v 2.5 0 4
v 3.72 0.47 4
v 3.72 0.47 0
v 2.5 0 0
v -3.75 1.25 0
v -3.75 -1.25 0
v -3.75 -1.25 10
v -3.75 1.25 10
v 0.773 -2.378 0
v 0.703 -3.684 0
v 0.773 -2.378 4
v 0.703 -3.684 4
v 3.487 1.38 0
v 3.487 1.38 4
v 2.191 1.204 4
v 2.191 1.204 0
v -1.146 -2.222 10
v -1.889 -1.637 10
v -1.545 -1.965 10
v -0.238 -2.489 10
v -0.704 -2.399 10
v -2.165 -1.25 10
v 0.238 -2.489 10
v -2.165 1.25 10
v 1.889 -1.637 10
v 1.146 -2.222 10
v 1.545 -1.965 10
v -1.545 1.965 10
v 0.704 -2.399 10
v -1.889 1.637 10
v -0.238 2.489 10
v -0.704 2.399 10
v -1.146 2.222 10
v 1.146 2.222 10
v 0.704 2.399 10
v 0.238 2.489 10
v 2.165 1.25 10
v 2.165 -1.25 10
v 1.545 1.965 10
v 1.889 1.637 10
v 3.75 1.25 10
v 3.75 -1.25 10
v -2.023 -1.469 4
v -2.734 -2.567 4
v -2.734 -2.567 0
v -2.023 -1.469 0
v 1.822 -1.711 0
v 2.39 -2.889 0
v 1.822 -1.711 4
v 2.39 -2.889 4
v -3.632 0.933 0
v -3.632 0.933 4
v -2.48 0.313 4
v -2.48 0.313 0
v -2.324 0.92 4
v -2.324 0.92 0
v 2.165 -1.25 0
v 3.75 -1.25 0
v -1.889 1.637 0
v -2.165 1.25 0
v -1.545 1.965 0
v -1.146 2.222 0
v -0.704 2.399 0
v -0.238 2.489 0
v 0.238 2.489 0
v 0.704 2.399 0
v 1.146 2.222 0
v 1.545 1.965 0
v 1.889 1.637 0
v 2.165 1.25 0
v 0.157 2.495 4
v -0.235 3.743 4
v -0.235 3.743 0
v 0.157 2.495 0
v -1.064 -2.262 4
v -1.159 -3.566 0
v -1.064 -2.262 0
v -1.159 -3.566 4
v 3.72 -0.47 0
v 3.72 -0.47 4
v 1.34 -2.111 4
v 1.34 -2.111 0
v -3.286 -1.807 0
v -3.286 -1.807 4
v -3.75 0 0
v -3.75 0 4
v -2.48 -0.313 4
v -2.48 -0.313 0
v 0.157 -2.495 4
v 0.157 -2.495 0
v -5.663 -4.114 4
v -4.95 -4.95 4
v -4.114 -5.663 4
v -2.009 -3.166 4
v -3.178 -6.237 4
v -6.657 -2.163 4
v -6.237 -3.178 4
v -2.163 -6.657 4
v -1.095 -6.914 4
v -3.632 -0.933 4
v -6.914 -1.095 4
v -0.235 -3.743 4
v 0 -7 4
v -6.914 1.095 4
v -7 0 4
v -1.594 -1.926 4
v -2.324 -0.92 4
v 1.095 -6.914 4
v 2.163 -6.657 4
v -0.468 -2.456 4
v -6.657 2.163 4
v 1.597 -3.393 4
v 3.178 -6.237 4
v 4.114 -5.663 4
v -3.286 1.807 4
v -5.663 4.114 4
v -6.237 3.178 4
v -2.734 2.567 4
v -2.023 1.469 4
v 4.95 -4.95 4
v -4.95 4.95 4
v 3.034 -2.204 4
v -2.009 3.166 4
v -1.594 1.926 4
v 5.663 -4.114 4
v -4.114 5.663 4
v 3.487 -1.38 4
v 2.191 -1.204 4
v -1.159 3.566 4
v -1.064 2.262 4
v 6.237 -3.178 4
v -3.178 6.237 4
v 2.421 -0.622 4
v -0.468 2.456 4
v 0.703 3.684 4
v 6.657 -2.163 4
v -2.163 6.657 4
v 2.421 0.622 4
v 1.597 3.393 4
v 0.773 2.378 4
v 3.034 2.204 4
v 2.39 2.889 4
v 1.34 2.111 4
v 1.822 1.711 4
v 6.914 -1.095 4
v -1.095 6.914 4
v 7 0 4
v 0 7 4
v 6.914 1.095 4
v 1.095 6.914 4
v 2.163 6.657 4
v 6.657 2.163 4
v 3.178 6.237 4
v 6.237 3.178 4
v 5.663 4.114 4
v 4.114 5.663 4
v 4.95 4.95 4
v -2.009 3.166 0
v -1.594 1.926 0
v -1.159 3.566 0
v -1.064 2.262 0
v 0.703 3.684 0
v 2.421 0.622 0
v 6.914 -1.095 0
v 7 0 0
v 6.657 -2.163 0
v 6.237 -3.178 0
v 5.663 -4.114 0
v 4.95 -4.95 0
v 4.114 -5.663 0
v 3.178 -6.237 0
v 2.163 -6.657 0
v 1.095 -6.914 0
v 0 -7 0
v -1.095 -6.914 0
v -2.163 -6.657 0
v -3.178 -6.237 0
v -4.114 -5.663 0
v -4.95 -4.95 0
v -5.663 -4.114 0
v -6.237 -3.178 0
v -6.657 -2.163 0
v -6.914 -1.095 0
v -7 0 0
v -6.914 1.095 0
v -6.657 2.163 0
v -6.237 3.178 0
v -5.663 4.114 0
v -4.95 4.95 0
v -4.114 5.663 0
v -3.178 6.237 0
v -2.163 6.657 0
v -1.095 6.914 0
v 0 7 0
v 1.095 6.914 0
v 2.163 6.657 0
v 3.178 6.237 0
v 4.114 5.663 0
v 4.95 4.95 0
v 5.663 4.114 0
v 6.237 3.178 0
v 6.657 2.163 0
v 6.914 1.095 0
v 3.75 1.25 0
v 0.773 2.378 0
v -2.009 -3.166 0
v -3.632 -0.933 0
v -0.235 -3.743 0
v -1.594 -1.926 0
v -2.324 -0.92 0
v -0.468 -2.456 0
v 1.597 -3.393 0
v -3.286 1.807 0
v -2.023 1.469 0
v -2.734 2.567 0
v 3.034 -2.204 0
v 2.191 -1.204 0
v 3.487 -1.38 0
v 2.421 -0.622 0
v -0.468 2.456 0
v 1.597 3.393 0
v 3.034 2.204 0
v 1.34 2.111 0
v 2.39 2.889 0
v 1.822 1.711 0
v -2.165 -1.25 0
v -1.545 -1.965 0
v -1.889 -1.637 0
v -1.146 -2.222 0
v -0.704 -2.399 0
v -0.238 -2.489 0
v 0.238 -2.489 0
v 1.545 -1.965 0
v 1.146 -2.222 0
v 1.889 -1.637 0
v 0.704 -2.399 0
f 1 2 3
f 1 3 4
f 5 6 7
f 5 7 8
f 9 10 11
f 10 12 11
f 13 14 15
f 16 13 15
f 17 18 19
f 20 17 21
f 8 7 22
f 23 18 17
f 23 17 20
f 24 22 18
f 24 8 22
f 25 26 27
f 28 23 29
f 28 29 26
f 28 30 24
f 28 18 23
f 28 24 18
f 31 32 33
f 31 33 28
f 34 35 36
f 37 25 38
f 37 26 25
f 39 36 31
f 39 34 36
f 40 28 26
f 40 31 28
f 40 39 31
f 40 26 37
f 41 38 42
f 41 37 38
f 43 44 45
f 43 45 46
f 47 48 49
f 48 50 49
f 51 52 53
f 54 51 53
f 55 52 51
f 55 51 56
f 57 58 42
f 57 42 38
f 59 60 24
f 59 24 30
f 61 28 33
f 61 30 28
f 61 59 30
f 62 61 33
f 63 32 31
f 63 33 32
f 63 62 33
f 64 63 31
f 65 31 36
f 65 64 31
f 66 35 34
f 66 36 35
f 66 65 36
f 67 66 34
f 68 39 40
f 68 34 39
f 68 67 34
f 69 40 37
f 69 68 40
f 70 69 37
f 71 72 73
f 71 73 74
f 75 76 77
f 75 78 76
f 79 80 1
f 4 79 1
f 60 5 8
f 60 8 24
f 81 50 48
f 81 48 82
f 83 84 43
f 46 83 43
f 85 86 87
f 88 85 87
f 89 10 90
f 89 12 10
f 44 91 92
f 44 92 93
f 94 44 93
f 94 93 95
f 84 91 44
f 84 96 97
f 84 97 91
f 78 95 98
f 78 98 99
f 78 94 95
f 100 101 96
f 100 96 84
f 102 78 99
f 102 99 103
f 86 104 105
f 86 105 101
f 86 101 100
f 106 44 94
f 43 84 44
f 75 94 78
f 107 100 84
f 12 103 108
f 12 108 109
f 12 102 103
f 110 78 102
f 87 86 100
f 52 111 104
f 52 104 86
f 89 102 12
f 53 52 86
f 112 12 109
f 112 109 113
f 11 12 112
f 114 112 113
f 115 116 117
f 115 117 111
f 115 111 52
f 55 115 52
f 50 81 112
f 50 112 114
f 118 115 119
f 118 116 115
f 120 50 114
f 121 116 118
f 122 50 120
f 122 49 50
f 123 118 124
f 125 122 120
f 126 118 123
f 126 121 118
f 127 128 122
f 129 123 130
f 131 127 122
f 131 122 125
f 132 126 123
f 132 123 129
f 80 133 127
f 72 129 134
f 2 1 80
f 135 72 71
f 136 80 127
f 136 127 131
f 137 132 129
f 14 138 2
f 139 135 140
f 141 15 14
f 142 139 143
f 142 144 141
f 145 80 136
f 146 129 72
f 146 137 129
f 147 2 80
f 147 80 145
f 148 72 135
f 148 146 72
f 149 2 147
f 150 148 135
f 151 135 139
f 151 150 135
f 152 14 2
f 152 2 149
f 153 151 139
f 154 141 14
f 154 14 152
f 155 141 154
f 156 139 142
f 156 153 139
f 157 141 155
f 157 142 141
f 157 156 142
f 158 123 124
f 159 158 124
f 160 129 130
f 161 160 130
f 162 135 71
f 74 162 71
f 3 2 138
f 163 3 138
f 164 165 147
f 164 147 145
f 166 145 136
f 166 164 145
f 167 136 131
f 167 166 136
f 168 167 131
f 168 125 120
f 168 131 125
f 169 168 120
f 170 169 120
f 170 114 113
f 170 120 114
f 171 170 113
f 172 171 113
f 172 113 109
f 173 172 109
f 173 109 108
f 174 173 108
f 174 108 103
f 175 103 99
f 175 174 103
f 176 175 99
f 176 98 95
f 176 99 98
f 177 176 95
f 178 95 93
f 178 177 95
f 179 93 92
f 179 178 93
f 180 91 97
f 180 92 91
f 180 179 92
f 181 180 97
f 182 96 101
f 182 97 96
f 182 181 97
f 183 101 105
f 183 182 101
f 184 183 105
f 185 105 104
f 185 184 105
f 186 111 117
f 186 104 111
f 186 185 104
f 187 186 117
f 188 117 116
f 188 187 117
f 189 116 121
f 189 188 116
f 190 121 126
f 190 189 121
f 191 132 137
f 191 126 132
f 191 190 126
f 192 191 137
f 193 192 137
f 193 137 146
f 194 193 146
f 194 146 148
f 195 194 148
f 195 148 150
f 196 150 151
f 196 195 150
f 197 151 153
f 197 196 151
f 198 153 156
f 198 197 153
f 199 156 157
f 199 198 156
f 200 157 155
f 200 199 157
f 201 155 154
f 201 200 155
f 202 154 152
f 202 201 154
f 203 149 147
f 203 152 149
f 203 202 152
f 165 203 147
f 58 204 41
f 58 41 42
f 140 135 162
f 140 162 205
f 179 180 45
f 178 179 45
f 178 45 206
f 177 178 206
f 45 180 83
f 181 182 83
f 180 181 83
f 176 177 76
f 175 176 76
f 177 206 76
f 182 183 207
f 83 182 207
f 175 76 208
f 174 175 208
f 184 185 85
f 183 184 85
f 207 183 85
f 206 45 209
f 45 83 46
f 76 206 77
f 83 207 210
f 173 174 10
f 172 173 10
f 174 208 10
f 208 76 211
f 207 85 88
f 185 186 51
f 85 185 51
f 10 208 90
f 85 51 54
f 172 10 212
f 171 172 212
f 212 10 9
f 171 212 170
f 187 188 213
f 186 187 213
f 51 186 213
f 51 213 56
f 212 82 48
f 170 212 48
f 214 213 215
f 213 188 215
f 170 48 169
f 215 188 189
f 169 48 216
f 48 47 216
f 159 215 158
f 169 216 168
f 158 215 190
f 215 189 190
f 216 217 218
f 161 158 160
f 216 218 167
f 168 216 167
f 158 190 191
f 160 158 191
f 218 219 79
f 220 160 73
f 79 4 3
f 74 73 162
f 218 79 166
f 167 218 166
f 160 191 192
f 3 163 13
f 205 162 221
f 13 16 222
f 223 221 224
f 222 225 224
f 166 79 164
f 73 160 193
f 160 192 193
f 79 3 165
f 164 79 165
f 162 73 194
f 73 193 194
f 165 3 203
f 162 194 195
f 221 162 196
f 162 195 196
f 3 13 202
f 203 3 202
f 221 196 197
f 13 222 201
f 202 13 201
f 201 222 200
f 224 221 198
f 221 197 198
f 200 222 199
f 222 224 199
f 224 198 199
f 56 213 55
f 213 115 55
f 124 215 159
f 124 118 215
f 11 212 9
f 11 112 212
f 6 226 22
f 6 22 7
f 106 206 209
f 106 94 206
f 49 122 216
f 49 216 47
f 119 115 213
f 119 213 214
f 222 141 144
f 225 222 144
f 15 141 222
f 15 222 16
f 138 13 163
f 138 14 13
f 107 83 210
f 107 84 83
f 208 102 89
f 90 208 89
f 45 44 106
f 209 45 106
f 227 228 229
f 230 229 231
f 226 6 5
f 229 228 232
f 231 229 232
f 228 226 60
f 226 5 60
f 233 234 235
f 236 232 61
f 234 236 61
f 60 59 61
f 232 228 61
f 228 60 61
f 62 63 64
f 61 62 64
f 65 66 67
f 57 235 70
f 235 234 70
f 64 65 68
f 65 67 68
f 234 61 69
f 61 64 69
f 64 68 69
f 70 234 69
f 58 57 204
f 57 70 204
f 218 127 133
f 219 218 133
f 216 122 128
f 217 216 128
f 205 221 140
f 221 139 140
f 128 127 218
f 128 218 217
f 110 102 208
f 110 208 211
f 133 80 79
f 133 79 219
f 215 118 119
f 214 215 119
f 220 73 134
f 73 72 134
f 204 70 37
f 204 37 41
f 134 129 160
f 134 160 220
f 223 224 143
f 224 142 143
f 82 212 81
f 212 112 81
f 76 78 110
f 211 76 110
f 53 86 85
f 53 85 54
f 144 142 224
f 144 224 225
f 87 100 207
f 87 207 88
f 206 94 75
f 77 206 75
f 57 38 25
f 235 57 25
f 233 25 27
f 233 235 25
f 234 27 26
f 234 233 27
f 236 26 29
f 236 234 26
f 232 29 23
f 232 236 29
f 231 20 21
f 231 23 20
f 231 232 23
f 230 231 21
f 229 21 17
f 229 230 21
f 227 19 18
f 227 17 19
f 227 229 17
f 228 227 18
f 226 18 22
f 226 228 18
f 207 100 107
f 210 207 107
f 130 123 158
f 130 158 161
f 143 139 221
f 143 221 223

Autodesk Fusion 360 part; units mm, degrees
sketch "Sketch1" plane through (0, 0, 0) normal (0, 0, 1) x (1, 0, 0)
  circle A0 centre (0, 0) radius 7
  dimension "d1" = 14
extrude "Extrude1" add sketch "Sketch1" along normal blind 10

Autodesk Fusion 360 part; units mm, degrees
sketch "Sketch1" plane through (0, 0, 0) normal (0, 0, 1) x (1, 0, 0)
  line L0 (-3.75, 1.25) -> (3.75, 1.25)
  line L1 (3.75, 1.25) -> (3.75, -1.25)
  line L2 (3.75, -1.25) -> (-3.75, -1.25)
  line L3 (-3.75, -1.25) -> (-3.75, 1.25)
  line L4 (-3.75, 1.25) -> (3.75, -1.25)
  line L5 (-3.75, -1.25) -> (3.75, 1.25)
  circle A0 centre (0, 0) radius 2.5
  dimension "d1" = 7.5
  dimension "d2" = 2.5
  dimension "d3" = 5
extrude "Extrude1" add sketch "Sketch1" along normal blind 5

Autodesk Fusion 360 part; units mm, degrees
sketch "Sketch15" plane through (0, 0, 0) normal (0, 0, 1) x (1, 0, 0)
  circle A0 centre (0, 0) radius 2.5
  circle A1 centre (0, 0) radius 7
  dimension "d65" = 5
  dimension "d67" = 14
extrude "Extrude12" add sketch "Sketch15" along normal blind 4 makes body 1
sketch "Sketch16" plane through (0, 0, 4) normal (0, 0, 1) x (-1, 0, 0)
  circle A0 centre (0, 0) radius 2.5
  circle A1 centre (0, 0) radius 7
  circle A2 centre (0, 0) radius 3.75
  line L0 (0, 0) -> (3.7204, 0.47)
  line L1 (0, 0) -> (3.75, 0) construction
  line L2 (0, 0) -> (3.7204, -0.47)
  line L3 (0, 0) -> (3.75, 0) construction
  line L4 (3.75, 0) -> (2.4803, -0.3133)
  line L5 (3.75, 0) -> (2.4803, 0.3133)
  dimension "d70" = 7.5
  dimension "d71" = 7.2
  dimension "d72" = 7.2
extrude "Extrude13" add sketch "Sketch16" against normal blind 4 separate body contours A0 L4 L5 makes body 2
pattern_circular "C-Pattern4" count 25 over 360 about axis through (0, 0, 1.75) along (0, 0, 1) of bodies 2 makes body 3 at (-3.2482, -0.7262, 2.6667) makes body 4 at (-2.9656, -1.5112, 2.6667) makes body 5 at (-2.3536, -2.3535, 2.6667) makes body 6 at (-1.6944, -2.8648, 2.6667) makes body 7 at (-0.9287, -3.1962, 2.6667) makes body 8 at (-0.1047, -3.3268, 2.6667) makes body 9 at (0.726, -3.2483, 2.6667) makes body 10 at (1.322, -3.0546, 2.6667) makes body 11 at (2.0401, -2.6299, 2.6667) makes body 12 at (2.63, -2.0399, 2.6667) makes body 13 at (3.1316, -1.1276, 2.6667) makes body 14 at (3.2874, -0.5206, 2.6667) makes body 15 at (3.2874, 0.5206, 2.6667) makes body 16 at (3.1316, 1.1276, 2.6667) makes body 17 at (2.63, 2.0399, 2.6667) makes body 18 at (2.0401, 2.6299, 2.6667) makes body 19 at (1.322, 3.0546, 2.6667) makes body 20 at (0.726, 3.2483, 2.6667) makes body 21 at (-0.3131, 3.3136, 2.6667) makes body 22 at (-1.1274, 3.1317, 2.6667) makes body 23 at (-1.8708, 2.7529, 2.6667) makes body 24 at (-2.4966, 2.2012, 2.6667) makes body 25 at (-2.9656, 1.5112, 2.6667) makes body 26 at (-3.2482, 0.7262, 2.6667)
combine "Combine4" operation cut target body 1 tool bodies 2 18 16 17 13 14 15 26 3 4 19 21 20 22 23 24 25 5 6 11 12 7 8 9 10
copy_body "Body->Comp1" bodies 1 removing the originals makes body 27 in component "Component"
component "Component" placed x (1, 0, 0) y (0, 1, 0) z (0, 0, 1) at (0, 0, 0)
